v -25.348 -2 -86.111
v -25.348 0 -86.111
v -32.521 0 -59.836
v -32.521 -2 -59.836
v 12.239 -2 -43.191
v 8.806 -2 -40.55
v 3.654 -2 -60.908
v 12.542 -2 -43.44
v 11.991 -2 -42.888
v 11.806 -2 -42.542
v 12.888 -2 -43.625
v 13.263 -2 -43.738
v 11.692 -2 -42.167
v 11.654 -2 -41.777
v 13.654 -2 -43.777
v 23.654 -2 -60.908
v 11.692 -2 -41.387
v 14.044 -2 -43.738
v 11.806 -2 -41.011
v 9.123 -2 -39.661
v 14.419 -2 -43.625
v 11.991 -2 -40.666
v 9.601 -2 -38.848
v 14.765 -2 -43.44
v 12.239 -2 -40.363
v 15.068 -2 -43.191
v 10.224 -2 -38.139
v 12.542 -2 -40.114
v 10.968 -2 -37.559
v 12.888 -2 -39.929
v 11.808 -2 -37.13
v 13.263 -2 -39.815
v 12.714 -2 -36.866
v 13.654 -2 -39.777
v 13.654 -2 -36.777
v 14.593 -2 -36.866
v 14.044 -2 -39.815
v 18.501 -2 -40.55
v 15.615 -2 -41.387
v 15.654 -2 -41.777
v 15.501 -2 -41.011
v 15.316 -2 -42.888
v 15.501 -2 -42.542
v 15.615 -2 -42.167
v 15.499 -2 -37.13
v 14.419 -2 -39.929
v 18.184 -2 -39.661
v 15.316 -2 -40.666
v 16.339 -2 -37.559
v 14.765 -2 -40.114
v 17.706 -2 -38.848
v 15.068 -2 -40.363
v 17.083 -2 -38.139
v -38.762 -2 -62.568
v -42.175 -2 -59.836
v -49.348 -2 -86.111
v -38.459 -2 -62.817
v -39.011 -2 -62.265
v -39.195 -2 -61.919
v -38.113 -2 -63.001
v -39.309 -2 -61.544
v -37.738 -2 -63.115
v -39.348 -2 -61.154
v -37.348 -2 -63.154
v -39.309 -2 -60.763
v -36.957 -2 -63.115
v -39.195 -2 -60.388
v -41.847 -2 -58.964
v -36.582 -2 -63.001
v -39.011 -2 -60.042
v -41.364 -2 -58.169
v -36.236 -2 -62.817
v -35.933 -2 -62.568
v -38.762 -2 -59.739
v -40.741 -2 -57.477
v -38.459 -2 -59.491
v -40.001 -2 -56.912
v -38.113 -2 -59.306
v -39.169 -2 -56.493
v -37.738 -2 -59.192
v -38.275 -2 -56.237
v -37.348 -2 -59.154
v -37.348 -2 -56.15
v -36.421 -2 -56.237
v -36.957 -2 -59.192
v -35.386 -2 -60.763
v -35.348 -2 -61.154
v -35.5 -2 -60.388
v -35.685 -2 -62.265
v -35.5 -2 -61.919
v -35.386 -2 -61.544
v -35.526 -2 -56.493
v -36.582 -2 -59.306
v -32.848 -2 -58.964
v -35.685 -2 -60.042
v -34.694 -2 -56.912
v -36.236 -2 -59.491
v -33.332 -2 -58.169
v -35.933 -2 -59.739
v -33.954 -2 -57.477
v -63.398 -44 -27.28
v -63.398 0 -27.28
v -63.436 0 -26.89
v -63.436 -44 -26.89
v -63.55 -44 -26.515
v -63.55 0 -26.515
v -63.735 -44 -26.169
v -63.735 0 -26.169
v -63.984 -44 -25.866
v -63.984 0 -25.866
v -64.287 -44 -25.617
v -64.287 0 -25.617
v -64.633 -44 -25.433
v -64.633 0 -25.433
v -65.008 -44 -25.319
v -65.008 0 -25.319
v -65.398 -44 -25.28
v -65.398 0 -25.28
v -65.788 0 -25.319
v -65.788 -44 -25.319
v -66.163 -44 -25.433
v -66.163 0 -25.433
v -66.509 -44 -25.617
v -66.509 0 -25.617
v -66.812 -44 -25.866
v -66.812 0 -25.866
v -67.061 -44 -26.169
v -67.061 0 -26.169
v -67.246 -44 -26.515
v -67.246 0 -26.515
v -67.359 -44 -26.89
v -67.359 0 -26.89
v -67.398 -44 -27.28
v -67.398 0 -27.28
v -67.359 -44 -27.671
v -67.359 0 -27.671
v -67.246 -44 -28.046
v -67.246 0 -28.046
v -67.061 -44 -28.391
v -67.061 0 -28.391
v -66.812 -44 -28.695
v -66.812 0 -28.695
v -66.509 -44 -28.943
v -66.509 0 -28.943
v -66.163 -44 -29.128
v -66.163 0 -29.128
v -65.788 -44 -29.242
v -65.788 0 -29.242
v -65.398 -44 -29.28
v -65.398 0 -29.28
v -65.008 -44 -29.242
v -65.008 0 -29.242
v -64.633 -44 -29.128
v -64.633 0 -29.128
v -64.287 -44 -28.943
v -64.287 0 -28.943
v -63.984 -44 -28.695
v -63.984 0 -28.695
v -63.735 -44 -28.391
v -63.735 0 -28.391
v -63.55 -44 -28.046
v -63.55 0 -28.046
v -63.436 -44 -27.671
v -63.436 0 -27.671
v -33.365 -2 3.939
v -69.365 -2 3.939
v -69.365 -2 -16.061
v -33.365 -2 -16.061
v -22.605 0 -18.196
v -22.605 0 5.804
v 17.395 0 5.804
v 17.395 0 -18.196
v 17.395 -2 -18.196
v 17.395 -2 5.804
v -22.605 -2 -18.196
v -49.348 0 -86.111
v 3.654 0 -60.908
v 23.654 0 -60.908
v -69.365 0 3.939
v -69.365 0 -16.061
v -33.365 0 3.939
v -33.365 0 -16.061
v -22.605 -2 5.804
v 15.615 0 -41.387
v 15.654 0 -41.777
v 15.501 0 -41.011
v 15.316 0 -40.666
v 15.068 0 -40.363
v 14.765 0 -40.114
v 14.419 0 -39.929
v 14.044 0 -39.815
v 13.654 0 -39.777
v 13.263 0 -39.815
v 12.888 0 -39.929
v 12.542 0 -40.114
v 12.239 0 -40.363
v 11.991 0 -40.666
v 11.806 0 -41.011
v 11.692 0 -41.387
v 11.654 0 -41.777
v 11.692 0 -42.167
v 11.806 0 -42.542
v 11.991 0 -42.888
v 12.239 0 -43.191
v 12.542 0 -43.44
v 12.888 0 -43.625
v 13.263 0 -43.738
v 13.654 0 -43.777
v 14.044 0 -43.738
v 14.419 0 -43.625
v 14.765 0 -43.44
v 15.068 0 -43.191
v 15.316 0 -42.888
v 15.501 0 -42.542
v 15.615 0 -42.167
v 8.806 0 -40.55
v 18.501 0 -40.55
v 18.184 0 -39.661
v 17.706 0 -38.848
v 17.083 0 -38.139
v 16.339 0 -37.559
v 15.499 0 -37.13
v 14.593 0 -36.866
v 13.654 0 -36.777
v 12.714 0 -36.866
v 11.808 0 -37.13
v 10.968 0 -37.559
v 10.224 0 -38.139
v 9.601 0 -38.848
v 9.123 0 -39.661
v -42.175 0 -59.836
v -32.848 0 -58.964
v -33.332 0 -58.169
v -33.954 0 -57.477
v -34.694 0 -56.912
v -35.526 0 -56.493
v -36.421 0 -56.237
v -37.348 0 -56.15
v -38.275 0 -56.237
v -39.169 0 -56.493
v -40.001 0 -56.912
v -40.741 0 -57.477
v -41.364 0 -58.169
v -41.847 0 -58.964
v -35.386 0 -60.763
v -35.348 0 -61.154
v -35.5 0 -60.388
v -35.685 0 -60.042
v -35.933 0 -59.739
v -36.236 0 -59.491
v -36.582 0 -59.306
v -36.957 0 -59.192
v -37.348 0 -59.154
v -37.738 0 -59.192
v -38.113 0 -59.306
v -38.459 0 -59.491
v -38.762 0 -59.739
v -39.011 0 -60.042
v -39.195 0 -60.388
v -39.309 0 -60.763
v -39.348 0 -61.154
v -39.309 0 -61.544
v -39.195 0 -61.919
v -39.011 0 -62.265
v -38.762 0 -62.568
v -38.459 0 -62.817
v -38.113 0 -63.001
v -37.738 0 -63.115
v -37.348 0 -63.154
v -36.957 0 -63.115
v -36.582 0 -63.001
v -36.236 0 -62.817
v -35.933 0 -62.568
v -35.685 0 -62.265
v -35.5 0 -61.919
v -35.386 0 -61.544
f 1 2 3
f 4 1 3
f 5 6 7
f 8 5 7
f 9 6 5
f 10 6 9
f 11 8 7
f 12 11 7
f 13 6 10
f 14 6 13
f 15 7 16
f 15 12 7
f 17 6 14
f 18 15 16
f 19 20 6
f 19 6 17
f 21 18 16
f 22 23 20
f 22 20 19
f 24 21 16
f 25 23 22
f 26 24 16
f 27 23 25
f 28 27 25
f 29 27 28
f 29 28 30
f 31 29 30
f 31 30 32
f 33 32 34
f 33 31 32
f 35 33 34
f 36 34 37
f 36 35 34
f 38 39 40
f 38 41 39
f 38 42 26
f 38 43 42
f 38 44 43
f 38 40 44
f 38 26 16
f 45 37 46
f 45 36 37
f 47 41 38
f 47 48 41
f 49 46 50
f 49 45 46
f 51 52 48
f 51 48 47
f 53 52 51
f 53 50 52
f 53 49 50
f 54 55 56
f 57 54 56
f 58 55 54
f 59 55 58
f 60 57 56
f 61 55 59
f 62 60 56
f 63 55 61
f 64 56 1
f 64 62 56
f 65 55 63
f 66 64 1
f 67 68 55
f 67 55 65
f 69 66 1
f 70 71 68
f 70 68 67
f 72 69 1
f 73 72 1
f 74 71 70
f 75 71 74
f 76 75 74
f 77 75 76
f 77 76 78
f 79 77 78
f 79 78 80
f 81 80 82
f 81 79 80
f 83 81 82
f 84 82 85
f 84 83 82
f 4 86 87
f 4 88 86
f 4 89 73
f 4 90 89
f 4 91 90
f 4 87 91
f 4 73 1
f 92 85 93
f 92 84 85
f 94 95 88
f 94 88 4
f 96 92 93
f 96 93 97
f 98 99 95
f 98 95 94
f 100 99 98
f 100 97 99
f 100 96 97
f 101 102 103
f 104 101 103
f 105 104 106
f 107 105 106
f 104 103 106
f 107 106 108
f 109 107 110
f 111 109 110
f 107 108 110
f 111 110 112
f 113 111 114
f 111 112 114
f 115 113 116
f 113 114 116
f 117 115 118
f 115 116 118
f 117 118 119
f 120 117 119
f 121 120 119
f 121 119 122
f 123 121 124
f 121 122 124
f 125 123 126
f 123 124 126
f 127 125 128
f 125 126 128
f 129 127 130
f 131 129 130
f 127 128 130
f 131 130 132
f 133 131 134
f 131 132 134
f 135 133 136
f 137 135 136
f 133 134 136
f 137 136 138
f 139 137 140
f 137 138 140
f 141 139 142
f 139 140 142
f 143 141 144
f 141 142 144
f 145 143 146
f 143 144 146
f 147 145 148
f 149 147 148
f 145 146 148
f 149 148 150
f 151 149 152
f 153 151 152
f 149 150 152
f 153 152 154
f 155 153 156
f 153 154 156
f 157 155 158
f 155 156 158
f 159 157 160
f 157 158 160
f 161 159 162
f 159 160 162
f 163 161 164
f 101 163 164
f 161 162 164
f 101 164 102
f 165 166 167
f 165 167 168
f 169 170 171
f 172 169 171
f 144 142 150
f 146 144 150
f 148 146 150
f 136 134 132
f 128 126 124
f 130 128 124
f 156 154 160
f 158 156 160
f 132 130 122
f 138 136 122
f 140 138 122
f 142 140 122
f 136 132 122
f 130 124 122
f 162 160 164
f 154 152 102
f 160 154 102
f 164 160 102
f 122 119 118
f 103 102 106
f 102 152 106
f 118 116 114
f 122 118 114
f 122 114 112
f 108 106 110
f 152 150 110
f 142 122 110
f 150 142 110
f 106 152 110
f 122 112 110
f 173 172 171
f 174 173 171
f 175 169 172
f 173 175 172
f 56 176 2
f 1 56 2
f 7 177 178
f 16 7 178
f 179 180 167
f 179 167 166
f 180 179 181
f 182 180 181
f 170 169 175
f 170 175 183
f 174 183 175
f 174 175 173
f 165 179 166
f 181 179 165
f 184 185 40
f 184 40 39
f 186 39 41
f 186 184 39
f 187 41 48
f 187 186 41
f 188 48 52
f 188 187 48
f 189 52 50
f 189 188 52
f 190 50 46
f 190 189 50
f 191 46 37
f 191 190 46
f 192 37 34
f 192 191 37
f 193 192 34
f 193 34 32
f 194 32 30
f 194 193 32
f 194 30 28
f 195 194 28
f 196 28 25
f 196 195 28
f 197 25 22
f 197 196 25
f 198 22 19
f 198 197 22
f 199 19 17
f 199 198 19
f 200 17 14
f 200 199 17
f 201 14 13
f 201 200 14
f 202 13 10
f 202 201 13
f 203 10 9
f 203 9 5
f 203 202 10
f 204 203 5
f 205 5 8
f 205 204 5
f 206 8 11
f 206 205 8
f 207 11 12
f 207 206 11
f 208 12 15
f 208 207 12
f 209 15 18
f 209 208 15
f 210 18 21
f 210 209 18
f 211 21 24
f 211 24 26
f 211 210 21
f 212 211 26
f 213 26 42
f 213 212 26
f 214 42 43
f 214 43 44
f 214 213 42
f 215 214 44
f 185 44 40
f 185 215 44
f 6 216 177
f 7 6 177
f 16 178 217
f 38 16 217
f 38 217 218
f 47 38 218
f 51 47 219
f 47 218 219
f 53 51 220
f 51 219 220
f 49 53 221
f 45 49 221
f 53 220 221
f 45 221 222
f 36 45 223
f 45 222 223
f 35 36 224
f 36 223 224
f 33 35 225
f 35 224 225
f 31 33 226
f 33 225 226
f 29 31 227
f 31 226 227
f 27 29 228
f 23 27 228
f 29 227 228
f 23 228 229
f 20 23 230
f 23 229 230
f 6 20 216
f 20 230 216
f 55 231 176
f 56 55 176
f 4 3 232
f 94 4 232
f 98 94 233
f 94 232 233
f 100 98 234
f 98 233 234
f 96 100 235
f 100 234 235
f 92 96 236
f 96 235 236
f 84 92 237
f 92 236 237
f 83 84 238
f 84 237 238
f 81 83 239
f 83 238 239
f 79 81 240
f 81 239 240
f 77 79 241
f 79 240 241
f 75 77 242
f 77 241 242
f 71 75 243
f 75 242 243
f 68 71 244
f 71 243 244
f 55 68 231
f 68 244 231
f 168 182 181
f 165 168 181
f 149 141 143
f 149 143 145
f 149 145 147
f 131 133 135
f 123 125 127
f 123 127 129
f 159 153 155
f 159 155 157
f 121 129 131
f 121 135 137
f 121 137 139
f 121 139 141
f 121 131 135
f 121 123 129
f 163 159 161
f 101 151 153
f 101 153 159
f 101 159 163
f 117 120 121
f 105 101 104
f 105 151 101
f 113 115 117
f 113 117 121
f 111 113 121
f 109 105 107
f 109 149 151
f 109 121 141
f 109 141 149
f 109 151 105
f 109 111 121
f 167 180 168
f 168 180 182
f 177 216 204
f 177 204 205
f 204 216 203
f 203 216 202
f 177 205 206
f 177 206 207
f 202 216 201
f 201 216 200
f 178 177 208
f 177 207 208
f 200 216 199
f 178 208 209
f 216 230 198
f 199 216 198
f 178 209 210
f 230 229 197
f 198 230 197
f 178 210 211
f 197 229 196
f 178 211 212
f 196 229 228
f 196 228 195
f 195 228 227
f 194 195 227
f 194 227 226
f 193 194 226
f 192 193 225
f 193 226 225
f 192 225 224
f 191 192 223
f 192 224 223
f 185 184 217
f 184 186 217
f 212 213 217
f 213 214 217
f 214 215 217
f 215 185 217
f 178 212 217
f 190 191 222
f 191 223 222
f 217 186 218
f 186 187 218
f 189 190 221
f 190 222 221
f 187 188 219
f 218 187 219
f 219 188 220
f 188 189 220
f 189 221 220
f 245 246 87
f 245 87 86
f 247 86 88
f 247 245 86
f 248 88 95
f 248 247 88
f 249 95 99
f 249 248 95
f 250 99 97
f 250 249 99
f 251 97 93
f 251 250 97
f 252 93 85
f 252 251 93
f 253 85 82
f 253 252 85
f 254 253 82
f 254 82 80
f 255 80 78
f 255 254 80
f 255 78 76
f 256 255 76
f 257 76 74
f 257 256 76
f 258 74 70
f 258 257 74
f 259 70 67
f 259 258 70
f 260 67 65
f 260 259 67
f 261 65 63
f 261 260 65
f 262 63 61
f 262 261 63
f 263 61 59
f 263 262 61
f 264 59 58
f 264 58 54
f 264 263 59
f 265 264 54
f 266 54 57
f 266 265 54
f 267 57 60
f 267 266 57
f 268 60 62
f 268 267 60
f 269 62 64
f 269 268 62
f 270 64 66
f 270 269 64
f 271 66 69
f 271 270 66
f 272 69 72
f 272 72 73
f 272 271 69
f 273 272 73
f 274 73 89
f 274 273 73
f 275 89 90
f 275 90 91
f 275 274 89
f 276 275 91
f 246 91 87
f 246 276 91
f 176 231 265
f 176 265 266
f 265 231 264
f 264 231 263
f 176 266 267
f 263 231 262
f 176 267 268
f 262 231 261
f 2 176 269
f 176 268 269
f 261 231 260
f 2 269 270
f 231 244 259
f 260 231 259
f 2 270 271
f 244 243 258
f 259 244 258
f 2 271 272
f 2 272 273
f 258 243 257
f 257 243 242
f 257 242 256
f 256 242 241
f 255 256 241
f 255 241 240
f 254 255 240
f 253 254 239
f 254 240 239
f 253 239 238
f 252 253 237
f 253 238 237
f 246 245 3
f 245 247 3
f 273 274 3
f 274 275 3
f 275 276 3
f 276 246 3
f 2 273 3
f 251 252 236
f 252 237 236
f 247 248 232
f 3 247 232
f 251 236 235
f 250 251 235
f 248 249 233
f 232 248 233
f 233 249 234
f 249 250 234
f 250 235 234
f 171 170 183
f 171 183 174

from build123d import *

# Parameters (mm, degrees)
F0_W     = 40
F0_H     = 24
F1_DEPTH = 2
F2_R     = 2
F3_DEPTH = 2
F4_R     = 2
F5_DEPTH = 44
F6_W     = 36
F6_H     = 20
F7_DEPTH = 2
F8_R     = 2
F9_DEPTH = 2


# Not quite as in the source:
# - a feature of the source that left no trace in its solid (it failed there, or was rolled back) is left out


with BuildPart() as f1:
    # F0 (on Front) → F1 (new body)
    with BuildSketch(Plane.XZ):
        with Locations((-2.604843583, -6.1964805115)):
            Rectangle(F0_W, F0_H)
    extrude(amount=F1_DEPTH)


with BuildPart() as f3:
    # F2 (on Front) → F3 (new body)
    with BuildSketch(Plane.XZ):
        with BuildLine():
            Line((-42.1746947658, -59.8358749318), (-49.3476256423, -86.1108493255))
            Line((-49.3476256423, -86.1108493255), (-25.3476256423, -86.1108493255))
            Line((-25.3476256423, -86.1108493255), (-32.5205565188, -59.8358749318))
            ThreePointArc((-32.5205565188, -59.8358749318), (-32.3882734917, -60.4888642222), (-32.3439170108, -61.1536396093))
            ThreePointArc((-32.3439170108, -61.1536396093), (-38.0124010294, -66.1129917599), (-42.1746947658, -59.8358749318))
        make_face()
        with BuildLine():
            ThreePointArc((-32.5205565188, -59.8358749318), (-37.3476256423, -56.1499309779), (-42.1746947658, -59.8358749318))
            ThreePointArc((-42.1746947658, -59.8358749318), (-38.0124010294, -66.1129917599), (-32.3439170108, -61.1536396093))
            ThreePointArc((-32.3439170108, -61.1536396093), (-32.3882734917, -60.4888642222), (-32.5205565188, -59.8358749318))
        make_face()
        with Locations((-37.3476256423, -61.1536396093)):
            Circle(F2_R, mode=Mode.SUBTRACT)
    extrude(amount=F3_DEPTH)


with BuildPart() as f5:
    # F4 (on Front) → F5 (new body)
    with BuildSketch(Plane.XZ):
        with Locations((-65.3979107738, -27.2803399712)):
            Circle(F4_R)
    extrude(amount=F5_DEPTH)


with BuildPart() as f7:
    # F6 (on Front) → F7 (new body)
    with BuildSketch(Plane.XZ):
        with Locations((-51.3647299066, -6.0609190166)):
            Rectangle(F6_W, F6_H)
    extrude(amount=F7_DEPTH)


with BuildPart() as f9:
    # F8 (on Front) → F9 (new body)
    with BuildSketch(Plane.XZ):
        with BuildLine():
            Line((8.8063688133, -40.5499661908), (3.6535110436, -60.907963558))
            Line((3.6535110436, -60.907963558), (23.6535110436, -60.907963558))
            Line((23.6535110436, -60.907963558), (18.5006532739, -40.5499661908))
            ThreePointArc((18.5006532739, -40.5499661908), (18.6151494399, -41.1586587773), (18.6535110436, -41.7768370883))
            ThreePointArc((18.6535110436, -41.7768370883), (13.0353327326, -46.7384754847), (8.8063688133, -40.5499661908))
        make_face()
        with BuildLine():
            ThreePointArc((18.5006532739, -40.5499661908), (13.6535110436, -36.7768370883), (8.8063688133, -40.5499661908))
            ThreePointArc((8.8063688133, -40.5499661908), (13.0353327326, -46.7384754847), (18.6535110436, -41.7768370883))
            ThreePointArc((18.6535110436, -41.7768370883), (18.6151494399, -41.1586587773), (18.5006532739, -40.5499661908))
        make_face()
        with Locations((13.6535110436, -41.7768370883)):
            Circle(F8_R, mode=Mode.SUBTRACT)
    extrude(amount=F9_DEPTH)


solid = Compound([f1.part, f3.part, f5.part, f7.part, f9.part])
